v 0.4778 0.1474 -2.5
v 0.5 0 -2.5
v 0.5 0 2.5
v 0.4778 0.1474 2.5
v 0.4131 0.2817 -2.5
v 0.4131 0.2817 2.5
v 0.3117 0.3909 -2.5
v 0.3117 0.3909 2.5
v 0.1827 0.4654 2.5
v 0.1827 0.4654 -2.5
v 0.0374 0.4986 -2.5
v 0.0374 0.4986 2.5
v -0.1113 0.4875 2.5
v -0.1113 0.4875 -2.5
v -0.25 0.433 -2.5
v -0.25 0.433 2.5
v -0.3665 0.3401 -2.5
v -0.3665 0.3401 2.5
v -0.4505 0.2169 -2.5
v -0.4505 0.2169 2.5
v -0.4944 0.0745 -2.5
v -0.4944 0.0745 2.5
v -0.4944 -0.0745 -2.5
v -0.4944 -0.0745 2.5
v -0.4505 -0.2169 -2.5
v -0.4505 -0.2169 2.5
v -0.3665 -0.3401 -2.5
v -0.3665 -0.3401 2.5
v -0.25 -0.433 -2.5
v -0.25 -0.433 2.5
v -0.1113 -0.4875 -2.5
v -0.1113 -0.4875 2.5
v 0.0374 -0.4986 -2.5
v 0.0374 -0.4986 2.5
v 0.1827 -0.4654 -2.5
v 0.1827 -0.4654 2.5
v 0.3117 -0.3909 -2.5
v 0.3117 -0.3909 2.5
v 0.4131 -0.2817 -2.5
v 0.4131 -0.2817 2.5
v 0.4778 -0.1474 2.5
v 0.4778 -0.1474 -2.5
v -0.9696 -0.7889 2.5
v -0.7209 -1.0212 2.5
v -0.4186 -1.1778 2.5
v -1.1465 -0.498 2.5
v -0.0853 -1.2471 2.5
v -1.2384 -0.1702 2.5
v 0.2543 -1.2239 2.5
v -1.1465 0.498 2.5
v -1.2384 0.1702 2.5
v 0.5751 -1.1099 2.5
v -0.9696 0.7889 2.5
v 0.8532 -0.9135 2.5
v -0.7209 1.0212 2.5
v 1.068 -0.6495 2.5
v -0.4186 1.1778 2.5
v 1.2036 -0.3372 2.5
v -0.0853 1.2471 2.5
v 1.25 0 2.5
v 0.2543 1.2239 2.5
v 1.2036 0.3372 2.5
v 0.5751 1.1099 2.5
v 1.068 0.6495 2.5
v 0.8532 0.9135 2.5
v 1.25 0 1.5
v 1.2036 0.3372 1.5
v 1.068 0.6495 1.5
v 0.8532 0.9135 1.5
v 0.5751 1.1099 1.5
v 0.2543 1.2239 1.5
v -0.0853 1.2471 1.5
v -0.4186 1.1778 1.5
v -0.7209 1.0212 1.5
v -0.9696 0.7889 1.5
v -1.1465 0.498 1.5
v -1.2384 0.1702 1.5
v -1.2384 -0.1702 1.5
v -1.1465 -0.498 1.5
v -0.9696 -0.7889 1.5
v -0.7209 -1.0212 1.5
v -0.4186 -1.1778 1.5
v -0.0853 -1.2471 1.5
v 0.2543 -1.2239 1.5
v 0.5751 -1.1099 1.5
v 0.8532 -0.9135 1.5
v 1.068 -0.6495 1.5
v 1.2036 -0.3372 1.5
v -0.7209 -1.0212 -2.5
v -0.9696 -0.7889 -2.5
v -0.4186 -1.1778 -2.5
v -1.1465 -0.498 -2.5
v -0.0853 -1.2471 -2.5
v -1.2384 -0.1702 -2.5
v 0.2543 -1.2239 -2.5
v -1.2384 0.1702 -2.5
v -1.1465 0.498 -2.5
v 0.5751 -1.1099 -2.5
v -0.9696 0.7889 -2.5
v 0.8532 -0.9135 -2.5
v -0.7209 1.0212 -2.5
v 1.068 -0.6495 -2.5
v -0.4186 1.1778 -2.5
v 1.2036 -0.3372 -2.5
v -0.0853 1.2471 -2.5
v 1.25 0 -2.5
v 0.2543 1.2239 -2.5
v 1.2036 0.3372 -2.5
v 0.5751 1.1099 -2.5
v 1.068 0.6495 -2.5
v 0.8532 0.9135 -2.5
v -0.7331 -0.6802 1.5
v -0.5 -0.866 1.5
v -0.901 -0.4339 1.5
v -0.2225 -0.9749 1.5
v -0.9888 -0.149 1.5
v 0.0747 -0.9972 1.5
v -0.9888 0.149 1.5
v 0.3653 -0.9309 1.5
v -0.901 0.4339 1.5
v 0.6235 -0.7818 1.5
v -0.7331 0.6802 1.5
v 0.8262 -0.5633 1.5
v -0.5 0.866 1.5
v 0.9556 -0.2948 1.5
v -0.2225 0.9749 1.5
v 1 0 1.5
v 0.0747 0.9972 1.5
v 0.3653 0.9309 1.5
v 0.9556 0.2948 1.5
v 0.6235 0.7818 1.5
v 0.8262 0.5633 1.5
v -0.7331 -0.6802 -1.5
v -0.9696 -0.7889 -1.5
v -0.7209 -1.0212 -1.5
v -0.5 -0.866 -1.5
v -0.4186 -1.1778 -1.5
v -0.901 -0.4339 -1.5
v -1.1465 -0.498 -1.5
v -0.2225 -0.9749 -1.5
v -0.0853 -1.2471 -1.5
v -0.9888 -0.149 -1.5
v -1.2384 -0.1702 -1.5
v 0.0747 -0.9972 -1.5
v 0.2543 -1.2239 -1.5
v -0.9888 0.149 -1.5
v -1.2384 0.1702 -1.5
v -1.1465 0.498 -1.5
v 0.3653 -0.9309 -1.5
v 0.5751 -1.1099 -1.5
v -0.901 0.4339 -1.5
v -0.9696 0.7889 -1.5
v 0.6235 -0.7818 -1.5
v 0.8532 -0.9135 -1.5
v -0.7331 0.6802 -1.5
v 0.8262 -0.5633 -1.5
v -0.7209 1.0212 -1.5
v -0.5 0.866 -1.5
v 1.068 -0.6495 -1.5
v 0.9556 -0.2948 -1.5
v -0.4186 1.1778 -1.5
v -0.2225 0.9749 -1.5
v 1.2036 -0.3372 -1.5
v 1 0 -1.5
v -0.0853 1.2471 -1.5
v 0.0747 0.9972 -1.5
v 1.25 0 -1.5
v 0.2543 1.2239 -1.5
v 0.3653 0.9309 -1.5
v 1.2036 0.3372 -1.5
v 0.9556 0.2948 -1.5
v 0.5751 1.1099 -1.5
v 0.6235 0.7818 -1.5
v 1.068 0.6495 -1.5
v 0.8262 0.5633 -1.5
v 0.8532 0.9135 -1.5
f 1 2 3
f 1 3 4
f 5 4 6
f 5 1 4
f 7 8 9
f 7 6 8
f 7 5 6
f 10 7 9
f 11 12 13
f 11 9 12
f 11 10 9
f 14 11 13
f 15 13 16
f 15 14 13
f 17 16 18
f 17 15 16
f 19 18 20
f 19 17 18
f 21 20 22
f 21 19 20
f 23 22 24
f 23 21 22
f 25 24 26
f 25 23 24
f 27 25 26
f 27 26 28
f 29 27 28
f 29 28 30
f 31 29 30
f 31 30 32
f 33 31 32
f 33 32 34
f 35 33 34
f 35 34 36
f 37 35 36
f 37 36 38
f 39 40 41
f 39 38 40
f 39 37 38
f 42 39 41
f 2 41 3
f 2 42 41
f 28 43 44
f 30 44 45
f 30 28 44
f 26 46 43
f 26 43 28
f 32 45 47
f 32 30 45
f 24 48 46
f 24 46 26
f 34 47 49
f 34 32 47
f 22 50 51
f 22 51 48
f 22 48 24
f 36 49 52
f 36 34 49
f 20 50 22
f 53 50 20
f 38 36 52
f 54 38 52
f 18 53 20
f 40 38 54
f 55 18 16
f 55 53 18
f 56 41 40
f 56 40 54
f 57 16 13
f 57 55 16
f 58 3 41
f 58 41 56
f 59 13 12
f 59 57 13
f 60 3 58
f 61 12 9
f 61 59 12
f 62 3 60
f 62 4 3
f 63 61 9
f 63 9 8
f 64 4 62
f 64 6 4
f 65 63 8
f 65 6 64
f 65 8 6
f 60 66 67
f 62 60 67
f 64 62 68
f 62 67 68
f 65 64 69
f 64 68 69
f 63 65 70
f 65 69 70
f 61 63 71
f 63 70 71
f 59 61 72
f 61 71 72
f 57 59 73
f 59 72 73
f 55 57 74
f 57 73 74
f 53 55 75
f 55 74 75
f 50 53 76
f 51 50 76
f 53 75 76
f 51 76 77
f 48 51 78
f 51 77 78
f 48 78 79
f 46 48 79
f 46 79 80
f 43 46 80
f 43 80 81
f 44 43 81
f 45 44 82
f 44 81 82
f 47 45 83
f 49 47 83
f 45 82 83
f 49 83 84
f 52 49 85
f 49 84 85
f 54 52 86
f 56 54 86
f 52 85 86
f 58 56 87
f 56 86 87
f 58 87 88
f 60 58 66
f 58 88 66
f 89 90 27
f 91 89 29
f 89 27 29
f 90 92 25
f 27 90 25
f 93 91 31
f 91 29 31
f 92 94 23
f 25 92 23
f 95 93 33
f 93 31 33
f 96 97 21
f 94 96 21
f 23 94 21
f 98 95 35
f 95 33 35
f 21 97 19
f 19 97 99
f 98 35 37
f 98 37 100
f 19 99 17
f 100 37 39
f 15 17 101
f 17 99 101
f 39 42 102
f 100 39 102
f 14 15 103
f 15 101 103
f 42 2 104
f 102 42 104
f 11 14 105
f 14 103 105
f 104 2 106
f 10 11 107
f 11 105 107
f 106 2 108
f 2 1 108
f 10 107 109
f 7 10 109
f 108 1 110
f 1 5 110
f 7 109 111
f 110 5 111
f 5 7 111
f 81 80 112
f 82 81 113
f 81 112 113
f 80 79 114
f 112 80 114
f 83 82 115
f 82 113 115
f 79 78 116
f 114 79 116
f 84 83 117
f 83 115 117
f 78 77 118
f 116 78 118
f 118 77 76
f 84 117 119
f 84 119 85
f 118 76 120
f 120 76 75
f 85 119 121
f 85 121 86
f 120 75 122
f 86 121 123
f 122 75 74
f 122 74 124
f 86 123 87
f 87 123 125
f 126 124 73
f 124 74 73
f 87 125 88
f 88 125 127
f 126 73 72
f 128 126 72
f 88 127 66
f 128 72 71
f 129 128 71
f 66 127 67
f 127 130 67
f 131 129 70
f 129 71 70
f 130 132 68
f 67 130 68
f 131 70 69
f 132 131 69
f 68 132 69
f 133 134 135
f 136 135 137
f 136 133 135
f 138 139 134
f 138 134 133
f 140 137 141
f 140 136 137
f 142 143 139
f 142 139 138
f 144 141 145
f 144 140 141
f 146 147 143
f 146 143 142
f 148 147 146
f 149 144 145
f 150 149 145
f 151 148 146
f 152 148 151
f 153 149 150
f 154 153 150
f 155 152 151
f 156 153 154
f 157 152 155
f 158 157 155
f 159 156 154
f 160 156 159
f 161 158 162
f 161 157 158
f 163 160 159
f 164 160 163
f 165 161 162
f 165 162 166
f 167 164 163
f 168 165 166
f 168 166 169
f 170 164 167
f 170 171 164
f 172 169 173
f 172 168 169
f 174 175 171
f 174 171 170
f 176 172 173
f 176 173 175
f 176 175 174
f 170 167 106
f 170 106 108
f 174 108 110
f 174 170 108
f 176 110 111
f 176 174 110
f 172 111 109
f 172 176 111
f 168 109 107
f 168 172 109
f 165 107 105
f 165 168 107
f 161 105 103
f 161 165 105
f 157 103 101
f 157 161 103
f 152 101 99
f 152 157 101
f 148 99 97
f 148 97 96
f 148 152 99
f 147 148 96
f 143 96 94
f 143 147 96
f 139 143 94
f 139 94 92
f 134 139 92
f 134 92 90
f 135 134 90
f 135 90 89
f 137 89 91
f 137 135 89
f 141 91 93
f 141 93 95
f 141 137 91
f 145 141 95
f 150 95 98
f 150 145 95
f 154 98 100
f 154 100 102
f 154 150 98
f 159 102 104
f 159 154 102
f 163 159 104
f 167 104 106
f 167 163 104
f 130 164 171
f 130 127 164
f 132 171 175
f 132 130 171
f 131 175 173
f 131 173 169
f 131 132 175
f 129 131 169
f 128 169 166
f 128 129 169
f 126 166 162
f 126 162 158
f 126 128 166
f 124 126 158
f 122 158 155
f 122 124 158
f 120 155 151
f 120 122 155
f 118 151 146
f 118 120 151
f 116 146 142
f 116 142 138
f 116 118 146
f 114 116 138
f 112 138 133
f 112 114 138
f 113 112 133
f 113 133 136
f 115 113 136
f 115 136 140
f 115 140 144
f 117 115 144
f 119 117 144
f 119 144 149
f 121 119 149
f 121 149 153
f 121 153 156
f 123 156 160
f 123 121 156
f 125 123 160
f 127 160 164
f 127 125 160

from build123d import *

# Parameters (mm, degrees)
SKETCH1_R               = 1
BOSS_EXTRUDE1_DEPTH     = 1.5
SKETCH2_R               = 1.25
BOSS_EXTRUDE2_DEPTH     = 1
CUT_EXTRUDE1_DEPTH      = 4.061862178
CUT_EXTRUDE1_DEPTH_BACK = 4.061862178
SKETCH1_4_R             = 0.5


with BuildPart() as part:
    # Sketch1 → Boss-Extrude1 (new, symmetric)
    with BuildSketch(Plane.XY):
        Circle(SKETCH1_R)
    extrude(amount=BOSS_EXTRUDE1_DEPTH, both=True)

    # Sketch2 → Boss-Extrude2 (add)
    with BuildSketch(Plane.XY.offset(1.5)):
        Circle(SKETCH2_R)
    boss_extrude2 = extrude(amount=BOSS_EXTRUDE2_DEPTH)

    # Mirror1: Boss-Extrude2 across plane
    add(boss_extrude2.mirror(Plane.XY))

    # Sketch1<4> → Cut-Extrude1 (cut, two sides: drawn at the far end of the back side and taken through both)
    with BuildSketch(Plane.XY.offset(-CUT_EXTRUDE1_DEPTH_BACK)):
        Circle(SKETCH1_4_R)
    extrude(amount=CUT_EXTRUDE1_DEPTH + CUT_EXTRUDE1_DEPTH_BACK, mode=Mode.SUBTRACT)


solid = part.part
